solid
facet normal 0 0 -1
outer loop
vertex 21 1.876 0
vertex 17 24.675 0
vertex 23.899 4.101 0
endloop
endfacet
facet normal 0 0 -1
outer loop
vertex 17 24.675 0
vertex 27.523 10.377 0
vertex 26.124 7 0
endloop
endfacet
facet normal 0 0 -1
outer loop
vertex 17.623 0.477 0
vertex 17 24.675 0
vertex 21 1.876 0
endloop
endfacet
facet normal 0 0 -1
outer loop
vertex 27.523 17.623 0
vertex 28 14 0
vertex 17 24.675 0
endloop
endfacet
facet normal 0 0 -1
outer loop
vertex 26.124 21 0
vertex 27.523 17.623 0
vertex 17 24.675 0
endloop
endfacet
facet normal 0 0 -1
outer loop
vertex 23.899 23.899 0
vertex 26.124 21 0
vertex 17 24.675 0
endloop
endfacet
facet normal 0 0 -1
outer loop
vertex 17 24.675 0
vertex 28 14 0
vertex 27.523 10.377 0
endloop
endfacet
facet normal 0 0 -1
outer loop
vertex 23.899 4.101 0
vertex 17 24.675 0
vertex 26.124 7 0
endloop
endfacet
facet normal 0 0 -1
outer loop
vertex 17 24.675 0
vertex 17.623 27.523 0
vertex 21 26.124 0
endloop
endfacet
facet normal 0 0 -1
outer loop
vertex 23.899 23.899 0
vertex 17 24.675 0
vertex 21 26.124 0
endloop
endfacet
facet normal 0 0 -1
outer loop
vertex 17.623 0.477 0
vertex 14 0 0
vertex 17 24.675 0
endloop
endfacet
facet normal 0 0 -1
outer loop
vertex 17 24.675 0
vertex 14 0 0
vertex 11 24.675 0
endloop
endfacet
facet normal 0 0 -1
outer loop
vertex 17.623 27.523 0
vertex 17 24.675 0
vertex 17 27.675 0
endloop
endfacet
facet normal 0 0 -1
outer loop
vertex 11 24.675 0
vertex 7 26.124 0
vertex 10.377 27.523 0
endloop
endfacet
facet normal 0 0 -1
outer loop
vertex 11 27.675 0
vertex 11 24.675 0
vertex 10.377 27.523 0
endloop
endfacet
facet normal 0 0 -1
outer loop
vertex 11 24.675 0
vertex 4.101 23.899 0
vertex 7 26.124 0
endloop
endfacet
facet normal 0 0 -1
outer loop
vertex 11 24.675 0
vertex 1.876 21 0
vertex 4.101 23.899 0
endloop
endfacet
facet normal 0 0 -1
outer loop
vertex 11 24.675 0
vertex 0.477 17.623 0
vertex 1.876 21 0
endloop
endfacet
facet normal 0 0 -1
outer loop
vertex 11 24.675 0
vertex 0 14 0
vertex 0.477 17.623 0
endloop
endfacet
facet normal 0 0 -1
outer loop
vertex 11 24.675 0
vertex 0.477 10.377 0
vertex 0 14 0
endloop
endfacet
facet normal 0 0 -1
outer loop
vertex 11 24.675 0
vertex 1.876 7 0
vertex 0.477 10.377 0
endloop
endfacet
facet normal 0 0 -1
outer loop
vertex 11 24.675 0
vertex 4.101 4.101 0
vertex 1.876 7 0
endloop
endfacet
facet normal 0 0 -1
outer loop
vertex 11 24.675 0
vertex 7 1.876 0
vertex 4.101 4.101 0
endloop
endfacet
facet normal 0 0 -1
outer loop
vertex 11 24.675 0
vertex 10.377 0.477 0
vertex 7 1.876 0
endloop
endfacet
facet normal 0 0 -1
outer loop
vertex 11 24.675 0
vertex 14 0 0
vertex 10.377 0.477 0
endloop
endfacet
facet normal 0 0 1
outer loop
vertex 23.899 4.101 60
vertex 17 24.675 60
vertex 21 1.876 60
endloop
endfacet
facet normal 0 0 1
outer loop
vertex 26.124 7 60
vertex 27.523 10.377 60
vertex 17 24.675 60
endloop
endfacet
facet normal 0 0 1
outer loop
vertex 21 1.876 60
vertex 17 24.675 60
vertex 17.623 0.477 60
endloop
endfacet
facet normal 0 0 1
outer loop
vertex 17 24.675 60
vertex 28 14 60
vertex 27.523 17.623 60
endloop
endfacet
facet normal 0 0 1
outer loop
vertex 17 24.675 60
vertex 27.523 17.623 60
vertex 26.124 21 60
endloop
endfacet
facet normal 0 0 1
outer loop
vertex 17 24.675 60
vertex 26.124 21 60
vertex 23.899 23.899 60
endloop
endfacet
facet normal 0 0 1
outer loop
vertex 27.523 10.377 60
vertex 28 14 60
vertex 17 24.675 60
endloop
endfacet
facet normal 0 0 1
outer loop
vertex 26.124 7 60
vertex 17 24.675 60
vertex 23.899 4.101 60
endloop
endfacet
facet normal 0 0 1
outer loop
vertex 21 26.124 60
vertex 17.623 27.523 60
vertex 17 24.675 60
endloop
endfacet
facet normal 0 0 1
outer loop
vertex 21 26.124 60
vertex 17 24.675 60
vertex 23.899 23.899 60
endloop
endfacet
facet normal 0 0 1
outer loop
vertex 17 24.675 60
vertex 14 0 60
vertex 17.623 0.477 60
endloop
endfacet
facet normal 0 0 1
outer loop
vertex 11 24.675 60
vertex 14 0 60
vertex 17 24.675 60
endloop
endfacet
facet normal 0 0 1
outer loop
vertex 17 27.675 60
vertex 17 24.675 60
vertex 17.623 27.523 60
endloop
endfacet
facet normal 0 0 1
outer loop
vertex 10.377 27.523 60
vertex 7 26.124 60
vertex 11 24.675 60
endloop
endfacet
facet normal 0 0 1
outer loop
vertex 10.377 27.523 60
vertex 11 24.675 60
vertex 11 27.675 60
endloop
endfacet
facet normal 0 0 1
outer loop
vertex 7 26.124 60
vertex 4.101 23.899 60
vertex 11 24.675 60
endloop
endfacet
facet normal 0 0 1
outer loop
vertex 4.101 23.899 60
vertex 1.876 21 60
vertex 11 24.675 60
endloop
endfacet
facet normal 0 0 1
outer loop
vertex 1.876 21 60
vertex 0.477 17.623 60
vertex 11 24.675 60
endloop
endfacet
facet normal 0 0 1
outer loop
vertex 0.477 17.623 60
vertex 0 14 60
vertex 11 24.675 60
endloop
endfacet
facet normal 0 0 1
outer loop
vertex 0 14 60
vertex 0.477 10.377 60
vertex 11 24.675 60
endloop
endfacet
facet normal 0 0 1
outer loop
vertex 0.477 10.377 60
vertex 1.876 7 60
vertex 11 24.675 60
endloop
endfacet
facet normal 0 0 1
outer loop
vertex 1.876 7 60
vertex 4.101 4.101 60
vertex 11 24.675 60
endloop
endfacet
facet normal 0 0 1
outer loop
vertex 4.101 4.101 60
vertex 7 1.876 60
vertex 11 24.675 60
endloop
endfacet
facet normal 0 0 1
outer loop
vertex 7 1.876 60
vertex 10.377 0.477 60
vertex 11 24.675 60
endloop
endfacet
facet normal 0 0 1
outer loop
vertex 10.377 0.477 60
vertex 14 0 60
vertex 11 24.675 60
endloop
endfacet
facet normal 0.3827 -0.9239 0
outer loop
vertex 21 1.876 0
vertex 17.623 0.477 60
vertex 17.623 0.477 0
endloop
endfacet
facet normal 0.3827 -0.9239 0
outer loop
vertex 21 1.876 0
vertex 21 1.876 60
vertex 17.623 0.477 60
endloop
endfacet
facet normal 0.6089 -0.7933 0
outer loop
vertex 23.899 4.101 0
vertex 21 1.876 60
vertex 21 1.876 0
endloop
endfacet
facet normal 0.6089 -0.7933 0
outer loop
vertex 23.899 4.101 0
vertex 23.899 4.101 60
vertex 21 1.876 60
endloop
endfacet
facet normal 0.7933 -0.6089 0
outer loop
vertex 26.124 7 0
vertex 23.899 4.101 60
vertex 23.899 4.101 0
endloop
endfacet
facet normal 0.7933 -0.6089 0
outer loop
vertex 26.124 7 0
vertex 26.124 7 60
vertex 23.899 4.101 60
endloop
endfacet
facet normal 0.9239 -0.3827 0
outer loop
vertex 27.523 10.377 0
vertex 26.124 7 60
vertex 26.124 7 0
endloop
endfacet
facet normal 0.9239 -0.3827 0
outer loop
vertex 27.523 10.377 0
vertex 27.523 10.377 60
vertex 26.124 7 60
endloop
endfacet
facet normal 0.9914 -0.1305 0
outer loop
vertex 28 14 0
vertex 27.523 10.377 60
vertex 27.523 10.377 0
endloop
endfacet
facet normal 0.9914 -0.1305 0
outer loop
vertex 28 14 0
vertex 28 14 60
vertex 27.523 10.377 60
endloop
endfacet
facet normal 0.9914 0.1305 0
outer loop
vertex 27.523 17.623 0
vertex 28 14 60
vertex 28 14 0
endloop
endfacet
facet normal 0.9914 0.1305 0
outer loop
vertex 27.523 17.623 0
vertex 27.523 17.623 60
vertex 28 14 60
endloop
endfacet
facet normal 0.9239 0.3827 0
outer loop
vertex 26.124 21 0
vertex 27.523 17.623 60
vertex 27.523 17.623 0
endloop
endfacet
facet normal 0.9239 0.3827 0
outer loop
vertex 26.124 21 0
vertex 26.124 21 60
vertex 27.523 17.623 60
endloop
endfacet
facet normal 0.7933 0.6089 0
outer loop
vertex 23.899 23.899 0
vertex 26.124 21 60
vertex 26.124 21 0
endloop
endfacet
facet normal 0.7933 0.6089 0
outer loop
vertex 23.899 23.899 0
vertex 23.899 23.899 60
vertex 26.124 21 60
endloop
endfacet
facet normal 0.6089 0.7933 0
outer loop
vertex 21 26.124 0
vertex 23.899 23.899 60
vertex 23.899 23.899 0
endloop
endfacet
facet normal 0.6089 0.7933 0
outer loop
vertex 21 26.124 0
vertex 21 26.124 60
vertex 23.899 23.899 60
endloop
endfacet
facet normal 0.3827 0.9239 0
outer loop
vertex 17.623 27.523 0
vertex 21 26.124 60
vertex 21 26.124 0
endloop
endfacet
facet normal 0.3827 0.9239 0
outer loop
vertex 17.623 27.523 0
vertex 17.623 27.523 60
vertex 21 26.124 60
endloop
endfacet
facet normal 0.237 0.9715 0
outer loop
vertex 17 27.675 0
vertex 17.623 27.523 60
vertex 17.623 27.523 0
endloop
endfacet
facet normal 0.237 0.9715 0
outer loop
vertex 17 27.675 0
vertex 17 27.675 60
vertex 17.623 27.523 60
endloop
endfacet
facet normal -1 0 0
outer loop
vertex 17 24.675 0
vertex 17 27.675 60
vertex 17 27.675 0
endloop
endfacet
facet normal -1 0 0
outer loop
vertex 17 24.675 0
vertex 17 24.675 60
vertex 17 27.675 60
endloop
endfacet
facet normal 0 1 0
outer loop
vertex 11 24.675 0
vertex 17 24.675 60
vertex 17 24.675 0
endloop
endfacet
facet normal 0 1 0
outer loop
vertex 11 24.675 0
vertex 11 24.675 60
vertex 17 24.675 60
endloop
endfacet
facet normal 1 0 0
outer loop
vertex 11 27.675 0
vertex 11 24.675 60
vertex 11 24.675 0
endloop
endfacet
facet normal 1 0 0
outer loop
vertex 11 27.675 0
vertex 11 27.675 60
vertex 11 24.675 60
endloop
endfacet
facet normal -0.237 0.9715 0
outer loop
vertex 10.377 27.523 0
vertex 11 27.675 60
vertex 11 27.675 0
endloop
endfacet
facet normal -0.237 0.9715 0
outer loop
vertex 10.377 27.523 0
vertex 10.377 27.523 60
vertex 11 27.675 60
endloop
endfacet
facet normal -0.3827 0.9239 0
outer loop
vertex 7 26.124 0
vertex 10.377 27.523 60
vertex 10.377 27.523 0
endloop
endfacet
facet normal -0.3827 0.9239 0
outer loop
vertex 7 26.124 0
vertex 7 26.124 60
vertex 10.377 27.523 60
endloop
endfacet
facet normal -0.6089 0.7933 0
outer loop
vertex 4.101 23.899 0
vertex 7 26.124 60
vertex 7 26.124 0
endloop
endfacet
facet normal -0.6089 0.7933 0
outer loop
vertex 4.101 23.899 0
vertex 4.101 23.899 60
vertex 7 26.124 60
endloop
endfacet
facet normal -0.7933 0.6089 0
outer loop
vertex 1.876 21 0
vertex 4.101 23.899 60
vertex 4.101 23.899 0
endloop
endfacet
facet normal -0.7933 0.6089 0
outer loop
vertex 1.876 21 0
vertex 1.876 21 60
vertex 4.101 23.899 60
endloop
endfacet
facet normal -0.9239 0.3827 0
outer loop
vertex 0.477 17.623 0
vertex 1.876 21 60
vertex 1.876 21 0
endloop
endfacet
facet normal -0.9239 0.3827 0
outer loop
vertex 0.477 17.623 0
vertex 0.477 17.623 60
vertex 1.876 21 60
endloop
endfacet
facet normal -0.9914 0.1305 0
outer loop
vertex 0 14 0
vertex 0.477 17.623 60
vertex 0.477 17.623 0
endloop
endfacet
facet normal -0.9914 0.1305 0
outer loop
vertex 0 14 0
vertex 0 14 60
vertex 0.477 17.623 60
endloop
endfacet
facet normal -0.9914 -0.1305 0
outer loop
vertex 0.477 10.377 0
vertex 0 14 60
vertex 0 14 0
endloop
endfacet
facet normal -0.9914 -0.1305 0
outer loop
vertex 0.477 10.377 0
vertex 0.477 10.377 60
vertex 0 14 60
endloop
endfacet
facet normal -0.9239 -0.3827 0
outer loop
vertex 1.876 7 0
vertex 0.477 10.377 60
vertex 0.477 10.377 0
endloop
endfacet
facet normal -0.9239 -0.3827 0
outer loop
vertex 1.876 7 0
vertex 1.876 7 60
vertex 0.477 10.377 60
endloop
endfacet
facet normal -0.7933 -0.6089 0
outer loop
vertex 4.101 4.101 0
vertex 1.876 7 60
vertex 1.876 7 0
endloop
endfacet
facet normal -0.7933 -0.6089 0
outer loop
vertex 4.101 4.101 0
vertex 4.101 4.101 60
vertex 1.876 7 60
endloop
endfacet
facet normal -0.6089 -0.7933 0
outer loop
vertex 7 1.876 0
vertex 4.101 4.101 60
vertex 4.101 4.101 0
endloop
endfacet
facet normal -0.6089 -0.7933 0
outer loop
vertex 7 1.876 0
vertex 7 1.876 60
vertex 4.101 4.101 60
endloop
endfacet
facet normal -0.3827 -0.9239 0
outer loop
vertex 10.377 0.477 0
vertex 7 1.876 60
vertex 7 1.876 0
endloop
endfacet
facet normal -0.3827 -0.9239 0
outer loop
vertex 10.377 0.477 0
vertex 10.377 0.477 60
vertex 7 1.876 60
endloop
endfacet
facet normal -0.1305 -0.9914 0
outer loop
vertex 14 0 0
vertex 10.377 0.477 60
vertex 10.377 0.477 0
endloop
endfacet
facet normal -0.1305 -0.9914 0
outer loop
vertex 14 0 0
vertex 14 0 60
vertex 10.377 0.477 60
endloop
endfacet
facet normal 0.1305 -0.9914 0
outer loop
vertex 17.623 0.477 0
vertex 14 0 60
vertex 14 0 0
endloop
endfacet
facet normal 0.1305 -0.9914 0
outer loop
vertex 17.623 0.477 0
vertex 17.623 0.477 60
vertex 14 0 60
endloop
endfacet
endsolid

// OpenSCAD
$fn = 32;

// ----------------------------------------------------------------------
// Keyway shaft: d28 shaft, key 6 x 3 mm
// ----------------------------------------------------------------------

// --- parameters (mm) ---
shaft_r = 14;             // shaft radius
key_w = 6;                // keyway width
key_d = 3;                // keyway depth below the surface line
plate_t = 60;             // shaft length, Z (extrusion height)

shaft_d = 2 * shaft_r;  // shaft diameter
circle_step = 15;  // polygon sampling step, degrees

profile = [[10.377, 27.523], [7, 26.124], [4.101, 23.899], [1.876, 21], [0.477, 17.623], [0, 14], [0.477, 10.377], [1.876, 7], [4.101, 4.101], [7, 1.876], [10.377, 0.477], [14, 0], [17.623, 0.477], [21, 1.876], [23.899, 4.101], [26.124, 7], [27.523, 10.377], [28, 14], [27.523, 17.623], [26.124, 21], [23.899, 23.899], [21, 26.124], [17.623, 27.523], [17, 27.675], [17, 24.675], [11, 24.675], [11, 27.675]];  // primary outline, 27 points, counter clockwise

// --- the one profile operation ---
linear_extrude(height = plate_t) polygon(points = profile);
